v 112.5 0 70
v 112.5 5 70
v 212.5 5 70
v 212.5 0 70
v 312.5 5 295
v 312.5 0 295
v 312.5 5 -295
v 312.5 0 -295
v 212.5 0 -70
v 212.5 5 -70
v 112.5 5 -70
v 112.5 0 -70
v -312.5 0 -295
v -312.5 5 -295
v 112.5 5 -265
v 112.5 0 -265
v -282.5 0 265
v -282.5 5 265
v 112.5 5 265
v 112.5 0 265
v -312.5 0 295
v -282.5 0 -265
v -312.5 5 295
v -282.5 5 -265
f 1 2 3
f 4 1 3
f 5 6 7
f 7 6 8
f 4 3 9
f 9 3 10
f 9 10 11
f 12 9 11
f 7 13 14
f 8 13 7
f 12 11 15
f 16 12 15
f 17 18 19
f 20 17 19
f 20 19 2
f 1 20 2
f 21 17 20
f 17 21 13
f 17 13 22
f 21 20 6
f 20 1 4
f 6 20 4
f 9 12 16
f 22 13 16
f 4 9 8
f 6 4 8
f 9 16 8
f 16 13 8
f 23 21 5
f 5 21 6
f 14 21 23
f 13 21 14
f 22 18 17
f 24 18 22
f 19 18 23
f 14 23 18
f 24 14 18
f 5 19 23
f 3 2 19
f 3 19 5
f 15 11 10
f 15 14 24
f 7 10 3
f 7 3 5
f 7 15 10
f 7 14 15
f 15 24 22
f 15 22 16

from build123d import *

# Parameters (mm, degrees)
SKETCH1_W           = 625
SKETCH1_H           = 590
BOSS_EXTRUDE1_DEPTH = 5
SKETCH2_W           = 395
SKETCH2_H           = 530
CUT_EXTRUDE1_DEPTH  = 23.4
CUT_EXTRUDE2_DEPTH  = 23.4


with BuildPart() as part:
    # Sketch1 → Boss-Extrude1 (new body)
    with BuildSketch(Plane(origin=(0, 0, 0), x_dir=(1, 0, 0), z_dir=(0, 1, 0))):
        Rectangle(SKETCH1_W, SKETCH1_H)
    extrude(amount=BOSS_EXTRUDE1_DEPTH)

    # Sketch2 → Cut-Extrude1 (cut)
    with BuildSketch(Plane(origin=(0, 5, 0), x_dir=(1, 0, 0), z_dir=(0, 1, 0))):
        with Locations((-85, 0)):
            Rectangle(SKETCH2_W, SKETCH2_H)
    extrude(amount=-CUT_EXTRUDE1_DEPTH, mode=Mode.SUBTRACT)

    # Sketch3 → Cut-Extrude2 (cut)
    with BuildSketch(Plane(origin=(0, 5, 0), x_dir=(1, 0, 0), z_dir=(0, 1, 0))):
        Polygon((112.5, 70), (112.5, 0), (112.5, -70), (212.5, -70), (212.5, 70), align=None)
    extrude(amount=-CUT_EXTRUDE2_DEPTH, mode=Mode.SUBTRACT)


solid = part.part
